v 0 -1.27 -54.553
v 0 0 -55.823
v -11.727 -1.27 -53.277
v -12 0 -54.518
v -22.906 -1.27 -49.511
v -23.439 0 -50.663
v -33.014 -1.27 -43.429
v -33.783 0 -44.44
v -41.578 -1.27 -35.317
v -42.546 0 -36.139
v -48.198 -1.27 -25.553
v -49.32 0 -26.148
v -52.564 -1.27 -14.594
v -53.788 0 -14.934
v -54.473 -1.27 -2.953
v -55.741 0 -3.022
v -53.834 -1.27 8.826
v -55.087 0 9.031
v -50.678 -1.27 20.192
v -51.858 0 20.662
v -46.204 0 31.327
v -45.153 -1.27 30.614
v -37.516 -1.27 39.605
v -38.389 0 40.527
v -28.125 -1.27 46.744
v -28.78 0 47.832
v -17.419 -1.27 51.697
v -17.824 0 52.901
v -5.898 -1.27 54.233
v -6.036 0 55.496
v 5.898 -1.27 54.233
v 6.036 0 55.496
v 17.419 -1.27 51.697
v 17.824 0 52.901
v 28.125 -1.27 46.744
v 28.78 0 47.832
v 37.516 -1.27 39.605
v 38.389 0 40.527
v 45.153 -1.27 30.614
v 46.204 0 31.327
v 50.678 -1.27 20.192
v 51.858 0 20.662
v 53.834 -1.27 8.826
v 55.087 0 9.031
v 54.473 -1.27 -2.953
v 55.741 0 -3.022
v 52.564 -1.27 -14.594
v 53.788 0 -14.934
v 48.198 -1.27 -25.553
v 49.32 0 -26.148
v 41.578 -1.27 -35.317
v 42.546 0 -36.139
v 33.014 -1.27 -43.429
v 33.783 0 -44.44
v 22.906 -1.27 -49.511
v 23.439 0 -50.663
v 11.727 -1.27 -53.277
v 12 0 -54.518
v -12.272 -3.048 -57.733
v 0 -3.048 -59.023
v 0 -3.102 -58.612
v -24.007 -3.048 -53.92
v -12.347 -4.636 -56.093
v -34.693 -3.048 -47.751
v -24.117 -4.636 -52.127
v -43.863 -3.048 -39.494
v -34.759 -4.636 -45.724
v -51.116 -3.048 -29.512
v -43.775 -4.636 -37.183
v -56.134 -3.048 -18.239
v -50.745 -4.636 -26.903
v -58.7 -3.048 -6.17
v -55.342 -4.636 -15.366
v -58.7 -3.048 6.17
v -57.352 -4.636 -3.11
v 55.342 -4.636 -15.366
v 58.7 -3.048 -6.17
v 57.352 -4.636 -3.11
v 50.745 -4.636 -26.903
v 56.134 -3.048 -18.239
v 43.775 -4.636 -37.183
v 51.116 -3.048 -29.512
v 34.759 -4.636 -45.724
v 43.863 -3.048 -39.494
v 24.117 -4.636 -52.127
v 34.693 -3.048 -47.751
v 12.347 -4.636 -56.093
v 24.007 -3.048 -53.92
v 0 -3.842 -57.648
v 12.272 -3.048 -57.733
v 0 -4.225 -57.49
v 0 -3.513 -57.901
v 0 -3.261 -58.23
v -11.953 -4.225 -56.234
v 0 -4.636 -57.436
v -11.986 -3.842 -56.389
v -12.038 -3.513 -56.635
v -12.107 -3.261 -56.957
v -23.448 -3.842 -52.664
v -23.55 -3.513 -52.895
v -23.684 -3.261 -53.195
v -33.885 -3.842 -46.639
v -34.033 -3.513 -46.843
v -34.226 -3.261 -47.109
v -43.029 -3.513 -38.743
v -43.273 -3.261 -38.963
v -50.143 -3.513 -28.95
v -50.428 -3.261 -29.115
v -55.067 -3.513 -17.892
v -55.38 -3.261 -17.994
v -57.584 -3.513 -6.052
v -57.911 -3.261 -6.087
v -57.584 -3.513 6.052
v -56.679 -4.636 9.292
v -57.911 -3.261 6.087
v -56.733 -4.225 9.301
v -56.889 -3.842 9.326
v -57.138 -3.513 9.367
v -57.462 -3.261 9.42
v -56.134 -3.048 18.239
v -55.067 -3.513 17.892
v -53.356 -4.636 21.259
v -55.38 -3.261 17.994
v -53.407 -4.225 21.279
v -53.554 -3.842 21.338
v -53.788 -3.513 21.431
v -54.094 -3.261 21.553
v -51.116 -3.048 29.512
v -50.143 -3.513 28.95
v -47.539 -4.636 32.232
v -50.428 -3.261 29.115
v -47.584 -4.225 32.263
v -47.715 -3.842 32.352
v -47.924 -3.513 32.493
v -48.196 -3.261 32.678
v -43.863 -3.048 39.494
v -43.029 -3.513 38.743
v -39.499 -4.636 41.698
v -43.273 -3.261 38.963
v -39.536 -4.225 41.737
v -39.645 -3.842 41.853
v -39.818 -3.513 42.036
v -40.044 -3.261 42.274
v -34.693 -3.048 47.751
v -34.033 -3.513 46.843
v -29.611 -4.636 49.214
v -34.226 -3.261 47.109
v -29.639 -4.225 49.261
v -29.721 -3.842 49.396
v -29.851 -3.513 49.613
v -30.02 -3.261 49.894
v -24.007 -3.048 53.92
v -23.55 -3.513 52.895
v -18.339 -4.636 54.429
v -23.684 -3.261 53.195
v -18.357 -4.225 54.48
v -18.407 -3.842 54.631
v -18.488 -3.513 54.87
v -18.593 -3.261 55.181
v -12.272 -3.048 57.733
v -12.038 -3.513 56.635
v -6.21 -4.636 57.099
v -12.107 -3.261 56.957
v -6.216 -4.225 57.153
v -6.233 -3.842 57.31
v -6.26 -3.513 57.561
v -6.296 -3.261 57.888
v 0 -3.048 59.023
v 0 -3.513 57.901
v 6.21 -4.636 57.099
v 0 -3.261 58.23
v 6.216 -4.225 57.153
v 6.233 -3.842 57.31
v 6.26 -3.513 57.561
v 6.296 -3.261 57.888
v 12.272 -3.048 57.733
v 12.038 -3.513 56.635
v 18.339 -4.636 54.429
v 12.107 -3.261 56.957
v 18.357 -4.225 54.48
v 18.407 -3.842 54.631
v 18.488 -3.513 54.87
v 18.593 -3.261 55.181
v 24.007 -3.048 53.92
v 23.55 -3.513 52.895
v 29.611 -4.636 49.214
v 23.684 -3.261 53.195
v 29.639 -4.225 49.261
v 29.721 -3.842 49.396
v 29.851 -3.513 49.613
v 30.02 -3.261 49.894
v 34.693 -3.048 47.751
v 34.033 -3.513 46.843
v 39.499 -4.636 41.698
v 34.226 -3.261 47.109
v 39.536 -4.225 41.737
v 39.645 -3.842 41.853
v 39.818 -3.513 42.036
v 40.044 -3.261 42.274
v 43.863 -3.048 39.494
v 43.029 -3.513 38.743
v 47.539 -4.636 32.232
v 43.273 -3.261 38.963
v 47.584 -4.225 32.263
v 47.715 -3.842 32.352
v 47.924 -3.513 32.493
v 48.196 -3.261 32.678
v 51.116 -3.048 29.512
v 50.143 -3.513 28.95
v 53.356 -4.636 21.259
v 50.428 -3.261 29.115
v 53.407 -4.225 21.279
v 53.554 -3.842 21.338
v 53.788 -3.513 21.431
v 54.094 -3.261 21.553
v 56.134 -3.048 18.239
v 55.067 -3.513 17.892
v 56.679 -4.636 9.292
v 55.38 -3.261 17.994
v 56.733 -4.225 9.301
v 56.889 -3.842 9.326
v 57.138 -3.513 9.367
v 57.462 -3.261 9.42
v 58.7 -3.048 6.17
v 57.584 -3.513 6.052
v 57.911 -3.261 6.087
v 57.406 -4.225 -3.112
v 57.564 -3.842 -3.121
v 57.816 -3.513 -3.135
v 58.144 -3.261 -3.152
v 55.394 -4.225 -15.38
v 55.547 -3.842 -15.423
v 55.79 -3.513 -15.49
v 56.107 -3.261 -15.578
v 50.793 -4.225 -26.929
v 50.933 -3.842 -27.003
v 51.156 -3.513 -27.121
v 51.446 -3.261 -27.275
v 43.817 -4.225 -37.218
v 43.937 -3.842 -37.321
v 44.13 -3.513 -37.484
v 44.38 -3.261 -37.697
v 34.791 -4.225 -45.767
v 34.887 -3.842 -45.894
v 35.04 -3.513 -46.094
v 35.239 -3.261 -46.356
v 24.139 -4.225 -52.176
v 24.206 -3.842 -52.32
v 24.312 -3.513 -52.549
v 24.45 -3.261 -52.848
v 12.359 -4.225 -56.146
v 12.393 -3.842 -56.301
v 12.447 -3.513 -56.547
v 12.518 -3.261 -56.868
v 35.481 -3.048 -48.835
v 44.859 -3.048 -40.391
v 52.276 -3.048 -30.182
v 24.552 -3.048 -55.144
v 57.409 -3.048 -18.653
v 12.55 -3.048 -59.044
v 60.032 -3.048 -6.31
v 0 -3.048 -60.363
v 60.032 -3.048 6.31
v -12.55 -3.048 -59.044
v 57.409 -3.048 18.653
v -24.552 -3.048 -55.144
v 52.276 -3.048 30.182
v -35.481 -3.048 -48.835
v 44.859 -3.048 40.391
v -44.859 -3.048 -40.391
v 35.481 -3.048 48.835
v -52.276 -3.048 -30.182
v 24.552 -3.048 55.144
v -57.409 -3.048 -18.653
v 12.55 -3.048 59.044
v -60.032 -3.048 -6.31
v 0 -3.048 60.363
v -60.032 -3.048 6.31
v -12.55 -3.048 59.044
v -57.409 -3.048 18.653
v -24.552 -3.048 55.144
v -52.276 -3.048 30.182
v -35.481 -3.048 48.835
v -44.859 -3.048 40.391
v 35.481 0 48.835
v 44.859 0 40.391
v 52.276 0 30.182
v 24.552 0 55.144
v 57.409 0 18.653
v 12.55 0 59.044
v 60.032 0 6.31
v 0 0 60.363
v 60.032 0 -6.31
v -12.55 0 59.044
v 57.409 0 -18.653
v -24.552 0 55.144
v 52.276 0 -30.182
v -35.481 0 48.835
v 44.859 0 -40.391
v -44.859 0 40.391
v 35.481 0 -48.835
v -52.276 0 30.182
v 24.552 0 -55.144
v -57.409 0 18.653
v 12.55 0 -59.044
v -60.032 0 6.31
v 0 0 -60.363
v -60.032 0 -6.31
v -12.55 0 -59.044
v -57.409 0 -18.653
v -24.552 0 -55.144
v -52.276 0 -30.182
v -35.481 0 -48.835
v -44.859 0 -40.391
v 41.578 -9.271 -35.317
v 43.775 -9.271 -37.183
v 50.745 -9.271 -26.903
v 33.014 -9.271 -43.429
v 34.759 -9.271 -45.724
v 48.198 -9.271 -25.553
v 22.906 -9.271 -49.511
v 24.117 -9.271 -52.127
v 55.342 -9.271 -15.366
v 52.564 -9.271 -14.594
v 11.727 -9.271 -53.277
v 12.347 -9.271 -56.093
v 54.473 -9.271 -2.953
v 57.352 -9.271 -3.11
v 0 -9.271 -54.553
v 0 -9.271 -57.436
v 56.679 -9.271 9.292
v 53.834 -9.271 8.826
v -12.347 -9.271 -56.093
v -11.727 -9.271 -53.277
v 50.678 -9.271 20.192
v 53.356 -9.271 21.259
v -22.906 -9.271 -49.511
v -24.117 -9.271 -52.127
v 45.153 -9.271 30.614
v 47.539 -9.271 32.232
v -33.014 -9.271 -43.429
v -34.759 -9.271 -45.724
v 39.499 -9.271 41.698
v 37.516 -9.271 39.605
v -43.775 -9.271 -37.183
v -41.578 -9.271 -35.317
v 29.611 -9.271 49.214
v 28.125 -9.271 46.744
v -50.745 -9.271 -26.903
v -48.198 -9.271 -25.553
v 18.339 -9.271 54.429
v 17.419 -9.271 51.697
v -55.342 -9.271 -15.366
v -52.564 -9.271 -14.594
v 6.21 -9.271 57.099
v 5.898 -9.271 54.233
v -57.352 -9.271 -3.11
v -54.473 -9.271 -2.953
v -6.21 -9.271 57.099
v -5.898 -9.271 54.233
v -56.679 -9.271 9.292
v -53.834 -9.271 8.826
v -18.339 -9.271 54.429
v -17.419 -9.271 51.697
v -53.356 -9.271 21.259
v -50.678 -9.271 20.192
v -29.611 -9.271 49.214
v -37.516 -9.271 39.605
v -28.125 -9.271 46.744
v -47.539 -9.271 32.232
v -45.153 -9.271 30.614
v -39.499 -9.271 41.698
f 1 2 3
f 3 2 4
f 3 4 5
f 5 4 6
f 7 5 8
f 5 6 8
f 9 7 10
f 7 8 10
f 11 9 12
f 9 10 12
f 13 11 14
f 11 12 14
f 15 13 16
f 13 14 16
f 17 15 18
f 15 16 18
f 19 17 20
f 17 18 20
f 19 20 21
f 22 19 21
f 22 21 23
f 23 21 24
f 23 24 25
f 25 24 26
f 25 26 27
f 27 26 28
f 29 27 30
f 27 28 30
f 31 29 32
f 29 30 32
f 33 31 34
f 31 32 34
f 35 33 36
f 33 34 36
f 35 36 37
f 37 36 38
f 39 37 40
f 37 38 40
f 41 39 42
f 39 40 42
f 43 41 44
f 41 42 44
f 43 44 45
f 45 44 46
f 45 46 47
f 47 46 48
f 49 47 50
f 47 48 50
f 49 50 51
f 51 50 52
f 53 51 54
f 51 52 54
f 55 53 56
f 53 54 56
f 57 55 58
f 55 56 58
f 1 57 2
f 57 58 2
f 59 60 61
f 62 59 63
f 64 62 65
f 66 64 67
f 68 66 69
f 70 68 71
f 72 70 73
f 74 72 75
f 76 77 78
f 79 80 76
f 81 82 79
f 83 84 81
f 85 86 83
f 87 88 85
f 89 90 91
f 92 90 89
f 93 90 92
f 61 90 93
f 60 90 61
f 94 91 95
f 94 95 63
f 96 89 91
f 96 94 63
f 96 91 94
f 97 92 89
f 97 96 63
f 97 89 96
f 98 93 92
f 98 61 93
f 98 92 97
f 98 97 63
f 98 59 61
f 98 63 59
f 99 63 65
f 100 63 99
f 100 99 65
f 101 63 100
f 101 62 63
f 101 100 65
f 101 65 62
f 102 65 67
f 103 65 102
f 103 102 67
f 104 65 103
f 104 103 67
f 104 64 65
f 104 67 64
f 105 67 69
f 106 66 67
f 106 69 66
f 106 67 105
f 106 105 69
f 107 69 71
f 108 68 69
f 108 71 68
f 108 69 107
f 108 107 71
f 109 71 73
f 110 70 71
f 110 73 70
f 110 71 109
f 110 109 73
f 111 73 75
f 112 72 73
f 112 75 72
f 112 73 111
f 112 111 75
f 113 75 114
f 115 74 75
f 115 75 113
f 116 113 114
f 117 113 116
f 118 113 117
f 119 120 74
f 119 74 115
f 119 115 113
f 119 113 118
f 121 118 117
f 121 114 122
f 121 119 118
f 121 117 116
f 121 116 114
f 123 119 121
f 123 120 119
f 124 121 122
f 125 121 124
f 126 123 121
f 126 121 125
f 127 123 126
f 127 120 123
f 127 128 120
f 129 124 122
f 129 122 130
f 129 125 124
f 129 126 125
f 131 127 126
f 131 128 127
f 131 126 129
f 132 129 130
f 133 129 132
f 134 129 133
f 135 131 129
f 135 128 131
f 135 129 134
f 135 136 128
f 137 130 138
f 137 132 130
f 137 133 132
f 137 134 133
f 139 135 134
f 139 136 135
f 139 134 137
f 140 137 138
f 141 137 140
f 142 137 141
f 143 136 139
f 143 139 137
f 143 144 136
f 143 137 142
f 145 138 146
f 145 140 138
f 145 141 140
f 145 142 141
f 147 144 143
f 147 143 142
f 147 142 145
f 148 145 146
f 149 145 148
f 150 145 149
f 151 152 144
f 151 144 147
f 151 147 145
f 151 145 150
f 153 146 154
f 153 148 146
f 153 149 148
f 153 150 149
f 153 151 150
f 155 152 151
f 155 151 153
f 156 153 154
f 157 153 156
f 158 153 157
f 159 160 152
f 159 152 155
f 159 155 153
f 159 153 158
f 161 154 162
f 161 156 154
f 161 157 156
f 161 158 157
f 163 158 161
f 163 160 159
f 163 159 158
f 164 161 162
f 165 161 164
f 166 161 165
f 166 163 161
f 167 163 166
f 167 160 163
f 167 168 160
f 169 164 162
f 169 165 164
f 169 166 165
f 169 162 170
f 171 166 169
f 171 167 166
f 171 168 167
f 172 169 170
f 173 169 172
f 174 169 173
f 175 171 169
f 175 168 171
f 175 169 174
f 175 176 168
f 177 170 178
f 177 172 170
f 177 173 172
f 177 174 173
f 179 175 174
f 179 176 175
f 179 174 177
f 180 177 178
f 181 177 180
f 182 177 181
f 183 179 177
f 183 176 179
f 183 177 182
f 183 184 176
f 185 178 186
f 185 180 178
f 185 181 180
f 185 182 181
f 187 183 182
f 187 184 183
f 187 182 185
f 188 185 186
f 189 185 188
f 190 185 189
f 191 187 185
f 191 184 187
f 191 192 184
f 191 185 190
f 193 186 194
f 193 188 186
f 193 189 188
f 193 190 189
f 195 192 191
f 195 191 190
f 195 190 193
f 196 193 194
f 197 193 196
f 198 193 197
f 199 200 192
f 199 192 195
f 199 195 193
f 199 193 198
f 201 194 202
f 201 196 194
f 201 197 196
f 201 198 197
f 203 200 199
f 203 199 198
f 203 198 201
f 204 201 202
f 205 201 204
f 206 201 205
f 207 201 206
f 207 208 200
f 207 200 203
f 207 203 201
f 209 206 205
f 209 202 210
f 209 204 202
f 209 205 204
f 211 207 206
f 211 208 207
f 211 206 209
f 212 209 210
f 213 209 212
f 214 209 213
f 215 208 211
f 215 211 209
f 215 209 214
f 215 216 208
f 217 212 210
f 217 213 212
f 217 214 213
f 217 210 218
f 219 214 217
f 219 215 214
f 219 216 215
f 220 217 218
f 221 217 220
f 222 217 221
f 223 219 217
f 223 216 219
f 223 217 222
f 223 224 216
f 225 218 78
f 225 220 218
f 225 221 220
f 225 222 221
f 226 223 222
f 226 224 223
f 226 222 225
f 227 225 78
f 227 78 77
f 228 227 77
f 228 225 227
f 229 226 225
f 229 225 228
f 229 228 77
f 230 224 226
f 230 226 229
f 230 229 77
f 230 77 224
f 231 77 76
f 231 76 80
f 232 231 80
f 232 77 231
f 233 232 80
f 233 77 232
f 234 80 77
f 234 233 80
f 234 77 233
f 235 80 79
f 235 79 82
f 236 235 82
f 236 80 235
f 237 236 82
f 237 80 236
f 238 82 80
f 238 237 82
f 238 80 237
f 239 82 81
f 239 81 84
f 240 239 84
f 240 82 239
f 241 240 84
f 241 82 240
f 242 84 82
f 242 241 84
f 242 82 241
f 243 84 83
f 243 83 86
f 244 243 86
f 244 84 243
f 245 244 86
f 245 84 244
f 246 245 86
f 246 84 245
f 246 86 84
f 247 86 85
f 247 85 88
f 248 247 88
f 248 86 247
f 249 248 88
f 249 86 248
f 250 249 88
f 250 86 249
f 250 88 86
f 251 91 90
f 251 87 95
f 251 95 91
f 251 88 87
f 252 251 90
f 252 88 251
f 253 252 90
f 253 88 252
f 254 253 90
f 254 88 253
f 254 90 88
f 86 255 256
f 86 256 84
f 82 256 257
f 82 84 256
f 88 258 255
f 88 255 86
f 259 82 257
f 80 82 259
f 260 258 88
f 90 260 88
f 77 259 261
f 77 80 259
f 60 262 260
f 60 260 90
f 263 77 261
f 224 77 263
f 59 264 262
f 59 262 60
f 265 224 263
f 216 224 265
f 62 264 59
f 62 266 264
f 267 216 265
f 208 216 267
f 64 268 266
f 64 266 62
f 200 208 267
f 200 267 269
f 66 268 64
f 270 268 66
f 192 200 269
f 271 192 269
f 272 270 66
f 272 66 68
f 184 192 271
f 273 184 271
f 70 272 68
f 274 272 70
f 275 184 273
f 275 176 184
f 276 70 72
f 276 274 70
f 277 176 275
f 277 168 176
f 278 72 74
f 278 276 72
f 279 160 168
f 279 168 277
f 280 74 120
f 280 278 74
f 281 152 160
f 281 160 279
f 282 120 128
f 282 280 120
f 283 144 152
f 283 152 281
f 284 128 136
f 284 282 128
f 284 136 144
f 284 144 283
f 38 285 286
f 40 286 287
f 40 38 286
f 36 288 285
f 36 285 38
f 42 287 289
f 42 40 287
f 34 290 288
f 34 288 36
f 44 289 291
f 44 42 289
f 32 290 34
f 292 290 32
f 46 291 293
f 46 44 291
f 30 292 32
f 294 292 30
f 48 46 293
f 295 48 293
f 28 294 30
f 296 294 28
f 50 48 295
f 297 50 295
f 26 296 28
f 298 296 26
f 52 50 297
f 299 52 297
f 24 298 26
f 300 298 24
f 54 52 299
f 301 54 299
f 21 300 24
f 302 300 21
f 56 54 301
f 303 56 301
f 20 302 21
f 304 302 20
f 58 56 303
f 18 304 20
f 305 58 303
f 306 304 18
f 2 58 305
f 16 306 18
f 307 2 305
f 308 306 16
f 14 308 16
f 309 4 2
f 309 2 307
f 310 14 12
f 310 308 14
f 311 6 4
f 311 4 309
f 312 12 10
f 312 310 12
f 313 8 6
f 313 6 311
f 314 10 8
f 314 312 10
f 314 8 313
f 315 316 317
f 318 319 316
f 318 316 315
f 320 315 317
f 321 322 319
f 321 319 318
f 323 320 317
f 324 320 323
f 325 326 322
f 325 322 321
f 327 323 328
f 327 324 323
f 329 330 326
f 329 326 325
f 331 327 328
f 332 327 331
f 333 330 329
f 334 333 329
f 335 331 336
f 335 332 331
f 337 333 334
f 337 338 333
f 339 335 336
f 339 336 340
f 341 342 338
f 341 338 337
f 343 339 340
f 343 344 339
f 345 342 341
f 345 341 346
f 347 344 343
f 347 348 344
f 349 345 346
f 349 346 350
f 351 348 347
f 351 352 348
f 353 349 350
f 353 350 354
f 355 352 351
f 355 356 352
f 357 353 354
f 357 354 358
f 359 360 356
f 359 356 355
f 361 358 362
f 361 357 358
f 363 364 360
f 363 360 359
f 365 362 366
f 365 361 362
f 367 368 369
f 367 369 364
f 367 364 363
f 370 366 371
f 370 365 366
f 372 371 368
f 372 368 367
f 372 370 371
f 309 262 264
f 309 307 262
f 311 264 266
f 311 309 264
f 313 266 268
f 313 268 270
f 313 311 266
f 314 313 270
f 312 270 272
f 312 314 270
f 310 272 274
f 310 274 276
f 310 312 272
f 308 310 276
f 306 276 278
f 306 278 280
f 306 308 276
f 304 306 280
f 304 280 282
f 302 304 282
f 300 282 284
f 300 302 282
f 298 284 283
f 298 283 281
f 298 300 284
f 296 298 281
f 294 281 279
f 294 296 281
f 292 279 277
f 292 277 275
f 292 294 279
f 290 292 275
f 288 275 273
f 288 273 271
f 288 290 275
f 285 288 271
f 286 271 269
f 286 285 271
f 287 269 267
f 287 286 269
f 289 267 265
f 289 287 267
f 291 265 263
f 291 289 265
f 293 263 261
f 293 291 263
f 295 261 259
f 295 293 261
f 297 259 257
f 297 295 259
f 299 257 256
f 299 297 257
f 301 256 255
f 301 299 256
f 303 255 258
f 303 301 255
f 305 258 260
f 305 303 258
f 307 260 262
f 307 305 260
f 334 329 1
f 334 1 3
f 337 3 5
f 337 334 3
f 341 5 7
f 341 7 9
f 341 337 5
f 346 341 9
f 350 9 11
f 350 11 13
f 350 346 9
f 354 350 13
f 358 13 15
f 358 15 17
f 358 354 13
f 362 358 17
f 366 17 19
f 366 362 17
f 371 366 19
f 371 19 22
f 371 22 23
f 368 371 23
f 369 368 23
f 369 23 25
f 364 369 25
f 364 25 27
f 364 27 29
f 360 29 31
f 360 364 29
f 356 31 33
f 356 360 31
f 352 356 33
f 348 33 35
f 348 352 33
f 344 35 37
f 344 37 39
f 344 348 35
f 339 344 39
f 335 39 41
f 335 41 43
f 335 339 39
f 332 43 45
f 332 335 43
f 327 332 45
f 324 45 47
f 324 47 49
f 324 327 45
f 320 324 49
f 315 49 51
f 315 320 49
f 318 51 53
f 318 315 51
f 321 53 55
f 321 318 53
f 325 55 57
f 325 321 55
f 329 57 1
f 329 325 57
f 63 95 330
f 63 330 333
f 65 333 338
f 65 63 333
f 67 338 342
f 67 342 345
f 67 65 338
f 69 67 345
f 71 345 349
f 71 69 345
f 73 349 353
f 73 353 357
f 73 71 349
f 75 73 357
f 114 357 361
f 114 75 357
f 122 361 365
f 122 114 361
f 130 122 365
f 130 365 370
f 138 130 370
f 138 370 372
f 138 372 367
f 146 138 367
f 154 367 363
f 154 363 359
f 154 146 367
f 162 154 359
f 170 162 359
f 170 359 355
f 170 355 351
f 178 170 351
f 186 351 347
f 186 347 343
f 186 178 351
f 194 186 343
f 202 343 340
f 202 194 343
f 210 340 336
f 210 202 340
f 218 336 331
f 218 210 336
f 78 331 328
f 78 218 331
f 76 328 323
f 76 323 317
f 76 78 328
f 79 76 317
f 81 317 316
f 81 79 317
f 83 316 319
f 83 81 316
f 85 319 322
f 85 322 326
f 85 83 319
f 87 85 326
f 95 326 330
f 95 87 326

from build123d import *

# Parameters (mm, degrees)
CHAMFER1_SIZE = 1.27
FILLET1_R     = 1.5875


with BuildPart() as part:
    # Sketch1 → Revolve1 (revolve)
    with BuildSketch(Plane.XY, mode=Mode.PRIVATE) as revolve1_sk:
        Polygon((-54.55285, 0), (-54.55285, -9.271), (-57.43575, -9.271), (-57.43575, -3.048), (-60.3631, -3.048), (-60.3631, 0), align=None)
    revolve(revolve1_sk.sketch.rotate(Axis((0, 0, 0), (0, 1, 0)), 270), axis=Axis((0, 0, 0), (0, 1, 0)))

    # Chamfer1
    chamfer1_edges = [part.edges().sort_by_distance(p)[0] for p in [
        (0, 0, 54.55285),
    ]]
    chamfer(chamfer1_edges, length=CHAMFER1_SIZE)

    # Fillet1
    fillet1_edges = [part.edges().sort_by_distance(p)[0] for p in [
        (0, -3.048, 57.43575),
    ]]
    fillet(fillet1_edges, radius=FILLET1_R)


solid = part.part
